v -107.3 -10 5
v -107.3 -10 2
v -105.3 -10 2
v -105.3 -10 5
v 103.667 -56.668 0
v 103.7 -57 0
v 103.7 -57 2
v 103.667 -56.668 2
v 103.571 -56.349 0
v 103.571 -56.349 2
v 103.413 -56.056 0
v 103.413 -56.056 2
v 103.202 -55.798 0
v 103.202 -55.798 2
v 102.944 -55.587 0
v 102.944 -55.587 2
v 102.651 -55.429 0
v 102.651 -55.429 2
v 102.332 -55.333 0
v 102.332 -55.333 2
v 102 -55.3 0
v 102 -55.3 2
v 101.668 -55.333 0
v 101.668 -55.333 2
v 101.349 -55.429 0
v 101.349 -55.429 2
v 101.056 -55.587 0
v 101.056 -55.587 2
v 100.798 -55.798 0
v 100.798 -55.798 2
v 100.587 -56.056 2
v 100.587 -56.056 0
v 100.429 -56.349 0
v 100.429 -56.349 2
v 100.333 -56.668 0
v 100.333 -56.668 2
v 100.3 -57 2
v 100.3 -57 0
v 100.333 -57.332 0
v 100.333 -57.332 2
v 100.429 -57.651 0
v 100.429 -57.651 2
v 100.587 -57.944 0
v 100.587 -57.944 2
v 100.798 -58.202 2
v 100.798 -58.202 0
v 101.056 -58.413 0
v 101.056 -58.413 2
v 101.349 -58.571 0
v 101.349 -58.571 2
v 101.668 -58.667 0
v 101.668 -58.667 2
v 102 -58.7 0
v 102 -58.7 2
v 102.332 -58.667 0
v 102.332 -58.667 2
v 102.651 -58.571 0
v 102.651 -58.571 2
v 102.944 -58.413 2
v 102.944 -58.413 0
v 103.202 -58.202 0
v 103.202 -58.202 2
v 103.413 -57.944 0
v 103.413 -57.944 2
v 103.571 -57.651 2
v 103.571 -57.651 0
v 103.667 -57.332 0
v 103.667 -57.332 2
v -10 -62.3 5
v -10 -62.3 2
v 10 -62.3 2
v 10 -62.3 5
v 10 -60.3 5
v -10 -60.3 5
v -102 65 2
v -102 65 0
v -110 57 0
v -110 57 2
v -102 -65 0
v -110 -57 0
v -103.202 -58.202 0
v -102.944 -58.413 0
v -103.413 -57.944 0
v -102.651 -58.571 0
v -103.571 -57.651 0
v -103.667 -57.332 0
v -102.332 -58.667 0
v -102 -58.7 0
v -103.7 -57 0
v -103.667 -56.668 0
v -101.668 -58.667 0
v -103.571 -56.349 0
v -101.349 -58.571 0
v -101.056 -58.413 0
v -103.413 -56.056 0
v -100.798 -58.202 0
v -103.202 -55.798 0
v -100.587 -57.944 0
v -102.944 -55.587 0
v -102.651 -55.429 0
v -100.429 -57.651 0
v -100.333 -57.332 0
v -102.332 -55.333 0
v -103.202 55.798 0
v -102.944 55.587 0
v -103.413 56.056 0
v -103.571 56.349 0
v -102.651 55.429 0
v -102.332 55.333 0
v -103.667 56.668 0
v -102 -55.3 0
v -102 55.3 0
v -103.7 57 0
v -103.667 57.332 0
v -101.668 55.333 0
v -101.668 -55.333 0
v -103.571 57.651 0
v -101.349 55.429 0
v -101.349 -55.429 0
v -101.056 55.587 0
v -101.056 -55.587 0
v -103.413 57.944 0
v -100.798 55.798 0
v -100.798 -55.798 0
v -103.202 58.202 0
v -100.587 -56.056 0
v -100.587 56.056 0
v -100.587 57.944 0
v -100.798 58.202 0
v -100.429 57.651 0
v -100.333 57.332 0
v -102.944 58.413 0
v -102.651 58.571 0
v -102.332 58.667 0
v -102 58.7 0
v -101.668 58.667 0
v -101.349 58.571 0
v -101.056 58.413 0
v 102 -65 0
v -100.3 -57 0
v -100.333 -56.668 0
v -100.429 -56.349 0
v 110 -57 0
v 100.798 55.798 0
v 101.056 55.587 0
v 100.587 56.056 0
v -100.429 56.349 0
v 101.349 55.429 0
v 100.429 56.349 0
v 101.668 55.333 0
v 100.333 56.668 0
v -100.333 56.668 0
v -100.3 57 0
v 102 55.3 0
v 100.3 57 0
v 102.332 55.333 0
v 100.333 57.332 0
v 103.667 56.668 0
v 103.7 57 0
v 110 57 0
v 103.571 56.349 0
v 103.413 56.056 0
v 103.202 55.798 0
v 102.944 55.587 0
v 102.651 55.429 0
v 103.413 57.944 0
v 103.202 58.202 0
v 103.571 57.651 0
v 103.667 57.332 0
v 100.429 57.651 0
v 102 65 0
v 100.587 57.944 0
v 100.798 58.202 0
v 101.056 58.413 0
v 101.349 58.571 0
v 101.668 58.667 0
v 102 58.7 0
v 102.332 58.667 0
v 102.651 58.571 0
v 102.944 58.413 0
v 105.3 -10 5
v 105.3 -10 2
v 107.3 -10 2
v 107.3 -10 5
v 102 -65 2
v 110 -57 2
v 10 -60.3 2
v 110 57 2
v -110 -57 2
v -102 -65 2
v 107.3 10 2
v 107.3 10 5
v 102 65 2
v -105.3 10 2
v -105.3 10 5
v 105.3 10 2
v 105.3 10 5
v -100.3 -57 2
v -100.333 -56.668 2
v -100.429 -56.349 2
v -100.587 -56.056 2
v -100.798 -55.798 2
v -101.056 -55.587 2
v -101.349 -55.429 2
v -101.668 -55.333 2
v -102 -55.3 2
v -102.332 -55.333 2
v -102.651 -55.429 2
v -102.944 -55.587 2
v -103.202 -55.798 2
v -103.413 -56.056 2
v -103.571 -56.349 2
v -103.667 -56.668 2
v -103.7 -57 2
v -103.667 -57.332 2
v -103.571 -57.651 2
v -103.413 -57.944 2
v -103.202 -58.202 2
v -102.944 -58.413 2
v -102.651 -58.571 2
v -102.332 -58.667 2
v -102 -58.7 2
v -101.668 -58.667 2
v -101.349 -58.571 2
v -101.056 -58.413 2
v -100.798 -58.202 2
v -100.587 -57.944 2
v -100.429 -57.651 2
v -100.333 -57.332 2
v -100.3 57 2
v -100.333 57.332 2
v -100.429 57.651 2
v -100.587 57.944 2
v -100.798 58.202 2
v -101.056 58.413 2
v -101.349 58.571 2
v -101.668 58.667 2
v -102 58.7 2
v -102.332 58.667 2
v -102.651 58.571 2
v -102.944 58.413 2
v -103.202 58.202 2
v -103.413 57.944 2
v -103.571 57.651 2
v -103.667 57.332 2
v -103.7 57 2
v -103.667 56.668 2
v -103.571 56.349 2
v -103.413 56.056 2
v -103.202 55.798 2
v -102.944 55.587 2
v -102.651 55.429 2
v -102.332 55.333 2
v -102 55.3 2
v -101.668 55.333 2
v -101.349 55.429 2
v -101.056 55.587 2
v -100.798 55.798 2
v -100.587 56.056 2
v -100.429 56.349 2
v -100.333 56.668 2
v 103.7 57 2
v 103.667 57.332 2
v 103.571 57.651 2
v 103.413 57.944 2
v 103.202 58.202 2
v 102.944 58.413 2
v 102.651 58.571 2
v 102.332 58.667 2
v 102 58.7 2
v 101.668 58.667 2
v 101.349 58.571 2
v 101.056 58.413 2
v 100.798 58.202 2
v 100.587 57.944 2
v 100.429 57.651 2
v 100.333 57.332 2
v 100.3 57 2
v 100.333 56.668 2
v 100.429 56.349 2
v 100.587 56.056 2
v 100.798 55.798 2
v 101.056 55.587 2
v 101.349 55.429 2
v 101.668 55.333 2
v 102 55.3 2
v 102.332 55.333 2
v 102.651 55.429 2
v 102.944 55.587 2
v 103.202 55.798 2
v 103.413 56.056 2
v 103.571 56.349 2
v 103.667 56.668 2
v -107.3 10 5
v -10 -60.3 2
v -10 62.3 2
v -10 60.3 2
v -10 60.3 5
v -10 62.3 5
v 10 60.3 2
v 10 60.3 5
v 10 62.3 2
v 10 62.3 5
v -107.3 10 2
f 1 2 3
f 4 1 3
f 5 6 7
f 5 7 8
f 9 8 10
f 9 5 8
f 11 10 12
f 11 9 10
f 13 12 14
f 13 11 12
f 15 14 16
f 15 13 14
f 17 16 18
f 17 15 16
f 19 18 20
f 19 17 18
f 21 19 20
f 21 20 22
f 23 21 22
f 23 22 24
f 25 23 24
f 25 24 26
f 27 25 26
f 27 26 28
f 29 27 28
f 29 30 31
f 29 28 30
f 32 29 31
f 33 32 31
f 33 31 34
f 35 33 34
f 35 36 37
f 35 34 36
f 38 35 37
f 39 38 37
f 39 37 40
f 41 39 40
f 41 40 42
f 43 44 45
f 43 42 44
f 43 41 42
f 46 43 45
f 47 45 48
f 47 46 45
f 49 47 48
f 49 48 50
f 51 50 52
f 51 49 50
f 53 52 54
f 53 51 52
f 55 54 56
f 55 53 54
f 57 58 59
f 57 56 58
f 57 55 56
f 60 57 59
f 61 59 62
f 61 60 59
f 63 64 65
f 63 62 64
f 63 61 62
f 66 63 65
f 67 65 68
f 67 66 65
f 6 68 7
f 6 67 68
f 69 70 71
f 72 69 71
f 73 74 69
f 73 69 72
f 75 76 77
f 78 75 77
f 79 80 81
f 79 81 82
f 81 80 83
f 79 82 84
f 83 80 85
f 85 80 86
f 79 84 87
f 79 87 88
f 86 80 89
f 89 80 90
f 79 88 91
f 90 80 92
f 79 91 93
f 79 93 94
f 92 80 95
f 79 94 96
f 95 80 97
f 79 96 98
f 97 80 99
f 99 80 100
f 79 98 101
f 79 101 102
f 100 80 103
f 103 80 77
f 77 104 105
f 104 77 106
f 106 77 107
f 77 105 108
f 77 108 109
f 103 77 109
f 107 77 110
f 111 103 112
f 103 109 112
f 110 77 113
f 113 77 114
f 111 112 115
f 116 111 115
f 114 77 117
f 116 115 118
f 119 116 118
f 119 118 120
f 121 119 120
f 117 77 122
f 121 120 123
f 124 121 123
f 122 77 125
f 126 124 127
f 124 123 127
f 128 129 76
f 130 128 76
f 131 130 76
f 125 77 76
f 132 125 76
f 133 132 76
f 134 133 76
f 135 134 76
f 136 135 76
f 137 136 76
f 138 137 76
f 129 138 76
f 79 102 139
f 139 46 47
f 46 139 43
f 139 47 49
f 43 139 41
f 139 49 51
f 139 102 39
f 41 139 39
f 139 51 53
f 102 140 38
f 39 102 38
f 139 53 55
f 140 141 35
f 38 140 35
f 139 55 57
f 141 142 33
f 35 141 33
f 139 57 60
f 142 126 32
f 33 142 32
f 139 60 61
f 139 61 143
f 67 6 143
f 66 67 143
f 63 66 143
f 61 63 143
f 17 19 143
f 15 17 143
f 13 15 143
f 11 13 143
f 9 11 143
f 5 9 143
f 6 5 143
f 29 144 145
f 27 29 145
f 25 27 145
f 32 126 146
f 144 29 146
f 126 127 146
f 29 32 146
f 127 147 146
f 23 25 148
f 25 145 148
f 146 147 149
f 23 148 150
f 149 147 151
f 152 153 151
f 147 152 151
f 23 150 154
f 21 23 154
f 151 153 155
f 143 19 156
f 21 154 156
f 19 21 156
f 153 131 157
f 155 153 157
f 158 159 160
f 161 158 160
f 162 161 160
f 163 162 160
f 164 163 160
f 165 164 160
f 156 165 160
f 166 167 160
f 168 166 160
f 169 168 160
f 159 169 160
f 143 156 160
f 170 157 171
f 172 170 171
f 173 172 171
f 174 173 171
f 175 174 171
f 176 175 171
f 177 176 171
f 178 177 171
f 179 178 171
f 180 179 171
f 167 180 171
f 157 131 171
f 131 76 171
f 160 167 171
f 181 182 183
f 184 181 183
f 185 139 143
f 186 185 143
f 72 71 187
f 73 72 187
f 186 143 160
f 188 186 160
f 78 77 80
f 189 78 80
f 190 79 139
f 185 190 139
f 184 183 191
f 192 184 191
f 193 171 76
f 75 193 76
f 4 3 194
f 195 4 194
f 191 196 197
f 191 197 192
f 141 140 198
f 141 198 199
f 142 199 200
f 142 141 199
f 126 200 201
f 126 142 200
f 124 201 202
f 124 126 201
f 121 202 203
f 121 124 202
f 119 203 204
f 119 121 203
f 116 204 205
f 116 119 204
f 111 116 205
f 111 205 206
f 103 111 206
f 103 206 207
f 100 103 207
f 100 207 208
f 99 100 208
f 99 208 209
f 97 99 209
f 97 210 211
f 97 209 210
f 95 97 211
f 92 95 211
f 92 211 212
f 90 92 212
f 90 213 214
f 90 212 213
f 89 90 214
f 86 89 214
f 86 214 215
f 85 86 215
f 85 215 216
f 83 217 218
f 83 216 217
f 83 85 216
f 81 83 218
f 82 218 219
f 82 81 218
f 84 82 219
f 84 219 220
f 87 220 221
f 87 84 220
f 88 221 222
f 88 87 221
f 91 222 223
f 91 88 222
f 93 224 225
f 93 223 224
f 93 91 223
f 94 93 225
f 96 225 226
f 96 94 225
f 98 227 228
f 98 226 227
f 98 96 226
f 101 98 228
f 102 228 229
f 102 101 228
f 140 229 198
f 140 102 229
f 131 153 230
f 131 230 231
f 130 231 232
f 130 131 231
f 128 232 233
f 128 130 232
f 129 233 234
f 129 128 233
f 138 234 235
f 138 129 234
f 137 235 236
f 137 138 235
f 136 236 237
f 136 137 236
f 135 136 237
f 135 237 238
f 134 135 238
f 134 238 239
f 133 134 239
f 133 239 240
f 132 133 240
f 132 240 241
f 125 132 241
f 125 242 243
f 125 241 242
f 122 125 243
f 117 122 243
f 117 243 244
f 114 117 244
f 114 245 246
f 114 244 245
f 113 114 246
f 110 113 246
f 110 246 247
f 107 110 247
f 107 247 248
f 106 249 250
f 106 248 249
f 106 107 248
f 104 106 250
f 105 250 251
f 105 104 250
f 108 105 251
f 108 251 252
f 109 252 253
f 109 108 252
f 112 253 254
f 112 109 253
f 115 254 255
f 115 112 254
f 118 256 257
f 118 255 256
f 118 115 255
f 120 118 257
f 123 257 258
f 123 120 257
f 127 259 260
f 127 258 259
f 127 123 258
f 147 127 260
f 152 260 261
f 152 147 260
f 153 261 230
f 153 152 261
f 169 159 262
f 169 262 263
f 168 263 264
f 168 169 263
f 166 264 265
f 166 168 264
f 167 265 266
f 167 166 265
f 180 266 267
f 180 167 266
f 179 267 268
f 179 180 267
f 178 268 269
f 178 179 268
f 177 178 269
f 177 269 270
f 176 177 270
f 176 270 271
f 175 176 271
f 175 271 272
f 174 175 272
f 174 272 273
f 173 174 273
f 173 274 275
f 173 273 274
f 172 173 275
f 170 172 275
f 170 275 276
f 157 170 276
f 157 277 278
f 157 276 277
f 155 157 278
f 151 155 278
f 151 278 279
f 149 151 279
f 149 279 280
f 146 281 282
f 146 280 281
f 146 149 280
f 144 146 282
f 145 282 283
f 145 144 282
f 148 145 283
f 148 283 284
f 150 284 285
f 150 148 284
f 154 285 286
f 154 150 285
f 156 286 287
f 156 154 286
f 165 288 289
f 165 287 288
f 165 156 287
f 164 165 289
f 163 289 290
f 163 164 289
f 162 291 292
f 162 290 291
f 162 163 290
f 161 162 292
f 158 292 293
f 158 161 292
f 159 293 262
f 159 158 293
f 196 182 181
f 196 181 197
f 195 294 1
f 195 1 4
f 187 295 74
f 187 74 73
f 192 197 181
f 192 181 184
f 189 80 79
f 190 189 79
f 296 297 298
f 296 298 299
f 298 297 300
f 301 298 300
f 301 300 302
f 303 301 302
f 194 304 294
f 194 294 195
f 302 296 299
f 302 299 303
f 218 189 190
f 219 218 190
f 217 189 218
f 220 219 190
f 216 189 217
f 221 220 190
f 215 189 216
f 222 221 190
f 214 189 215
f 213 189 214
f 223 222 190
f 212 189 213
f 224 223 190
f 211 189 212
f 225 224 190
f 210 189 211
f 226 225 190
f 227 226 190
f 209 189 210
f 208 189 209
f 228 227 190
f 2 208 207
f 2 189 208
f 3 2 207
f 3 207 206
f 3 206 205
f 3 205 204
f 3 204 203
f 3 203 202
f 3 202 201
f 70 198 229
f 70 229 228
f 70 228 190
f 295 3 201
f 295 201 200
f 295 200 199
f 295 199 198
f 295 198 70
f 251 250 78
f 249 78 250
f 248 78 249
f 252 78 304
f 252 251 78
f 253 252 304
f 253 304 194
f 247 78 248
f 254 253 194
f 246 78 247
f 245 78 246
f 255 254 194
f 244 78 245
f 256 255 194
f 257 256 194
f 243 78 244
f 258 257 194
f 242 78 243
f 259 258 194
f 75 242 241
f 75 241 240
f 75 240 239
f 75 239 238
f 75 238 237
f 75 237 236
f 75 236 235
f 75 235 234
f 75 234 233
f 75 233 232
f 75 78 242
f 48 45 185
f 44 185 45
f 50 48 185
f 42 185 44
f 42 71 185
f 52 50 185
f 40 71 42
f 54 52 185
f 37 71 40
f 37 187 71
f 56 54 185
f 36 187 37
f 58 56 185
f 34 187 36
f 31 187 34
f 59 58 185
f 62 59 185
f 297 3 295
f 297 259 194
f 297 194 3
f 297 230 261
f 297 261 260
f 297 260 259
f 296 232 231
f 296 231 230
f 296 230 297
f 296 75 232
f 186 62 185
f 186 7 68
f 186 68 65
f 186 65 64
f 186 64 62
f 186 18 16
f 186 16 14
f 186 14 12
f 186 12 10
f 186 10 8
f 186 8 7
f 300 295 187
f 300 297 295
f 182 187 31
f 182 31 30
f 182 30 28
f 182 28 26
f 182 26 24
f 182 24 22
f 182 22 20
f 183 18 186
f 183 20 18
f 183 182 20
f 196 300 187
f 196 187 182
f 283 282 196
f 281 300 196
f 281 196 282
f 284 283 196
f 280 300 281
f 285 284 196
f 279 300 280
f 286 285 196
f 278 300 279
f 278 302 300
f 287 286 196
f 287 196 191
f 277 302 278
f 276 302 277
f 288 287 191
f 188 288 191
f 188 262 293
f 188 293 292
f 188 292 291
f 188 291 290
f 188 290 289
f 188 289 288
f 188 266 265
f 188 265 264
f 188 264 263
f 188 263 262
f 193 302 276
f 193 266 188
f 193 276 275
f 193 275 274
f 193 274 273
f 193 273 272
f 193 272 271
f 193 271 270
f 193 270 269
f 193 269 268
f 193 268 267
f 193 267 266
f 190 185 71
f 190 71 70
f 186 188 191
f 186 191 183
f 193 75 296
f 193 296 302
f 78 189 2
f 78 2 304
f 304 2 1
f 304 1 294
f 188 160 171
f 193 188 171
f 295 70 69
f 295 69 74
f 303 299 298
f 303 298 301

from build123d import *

# Parameters (mm, degrees)
FACETED_REMOVABLE_LID_DEPTH  = 2
SIDE_LOCATOR_1_START         = 2
SKETCH2_W                    = 20
SKETCH2_H                    = 2
SIDE_LOCATOR_1_DEPTH         = 3
END_LOCATOR_1_START          = 2
SKETCH3_W                    = 2
SKETCH3_H                    = 20
END_LOCATOR_1_DEPTH          = 3
SKETCH4_W                    = 20
SKETCH4_H                    = 2
SIDE_LOCATOR_1_2_DEPTH       = 3
SKETCH5_W                    = 2
SKETCH5_H                    = 20
END_LOCATOR_1_2_DEPTH        = 3
M3_LID_CLEARANCE_1_1_START   = -0.1
SKETCH6_R                    = 1.7
M3_LID_CLEARANCE_1_1_DEPTH   = 2.2
SKETCH7_R                    = 1.7
M3_LID_CLEARANCE_1_1_2_DEPTH = 2.2
SKETCH8_R                    = 1.7
M3_LID_CLEARANCE_1_1_3_DEPTH = 2.2
SKETCH9_R                    = 1.7
M3_LID_CLEARANCE_1_1_4_DEPTH = 2.2


with BuildPart() as part:
    # Sketch1 → Faceted_Removable_Lid (new body)
    with BuildSketch(Plane.XY):
        Polygon((-102, -65), (102, -65), (110, -57), (110, 57), (102, 65), (-102, 65), (-110, 57), (-110, -57), align=None)
    extrude(amount=FACETED_REMOVABLE_LID_DEPTH)

    # Sketch2 → Side_Locator_-1 (add)
    with BuildSketch(Plane.XY.offset(SIDE_LOCATOR_1_START)):
        with Locations((0, -61.3)):
            Rectangle(SKETCH2_W, SKETCH2_H)
    extrude(amount=SIDE_LOCATOR_1_DEPTH)

    # Sketch3 → End_Locator_-1 (add)
    with BuildSketch(Plane.XY.offset(END_LOCATOR_1_START)):
        with Locations((-106.3, 0)):
            Rectangle(SKETCH3_W, SKETCH3_H)
    extrude(amount=END_LOCATOR_1_DEPTH)

    # Sketch4 → Side_Locator_1 2 (add)
    with BuildSketch(Plane.XY.offset(SIDE_LOCATOR_1_START)):
        with Locations((0, 61.3)):
            Rectangle(SKETCH4_W, SKETCH4_H)
    extrude(amount=SIDE_LOCATOR_1_2_DEPTH)

    # Sketch5 → End_Locator_1 2 (add)
    with BuildSketch(Plane.XY.offset(END_LOCATOR_1_START)):
        with Locations((106.3, 0)):
            Rectangle(SKETCH5_W, SKETCH5_H)
    extrude(amount=END_LOCATOR_1_2_DEPTH)

    # Sketch6 → M3_Lid_Clearance_-1_-1 (cut)
    with BuildSketch(Plane.XY.offset(M3_LID_CLEARANCE_1_1_START)):
        with Locations((-102, -57)):
            Circle(SKETCH6_R)
    extrude(amount=M3_LID_CLEARANCE_1_1_DEPTH, mode=Mode.SUBTRACT)

    # Sketch7 → M3_Lid_Clearance_-1_1 2 (cut)
    with BuildSketch(Plane.XY.offset(M3_LID_CLEARANCE_1_1_START)):
        with Locations((-102, 57)):
            Circle(SKETCH7_R)
    extrude(amount=M3_LID_CLEARANCE_1_1_2_DEPTH, mode=Mode.SUBTRACT)

    # Sketch8 → M3_Lid_Clearance_1_-1 3 (cut)
    with BuildSketch(Plane.XY.offset(M3_LID_CLEARANCE_1_1_START)):
        with Locations((102, -57)):
            Circle(SKETCH8_R)
    extrude(amount=M3_LID_CLEARANCE_1_1_3_DEPTH, mode=Mode.SUBTRACT)

    # Sketch9 → M3_Lid_Clearance_1_1 4 (cut)
    with BuildSketch(Plane.XY.offset(M3_LID_CLEARANCE_1_1_START)):
        with Locations((102, 57)):
            Circle(SKETCH9_R)
    extrude(amount=M3_LID_CLEARANCE_1_1_4_DEPTH, mode=Mode.SUBTRACT)


solid = part.part
